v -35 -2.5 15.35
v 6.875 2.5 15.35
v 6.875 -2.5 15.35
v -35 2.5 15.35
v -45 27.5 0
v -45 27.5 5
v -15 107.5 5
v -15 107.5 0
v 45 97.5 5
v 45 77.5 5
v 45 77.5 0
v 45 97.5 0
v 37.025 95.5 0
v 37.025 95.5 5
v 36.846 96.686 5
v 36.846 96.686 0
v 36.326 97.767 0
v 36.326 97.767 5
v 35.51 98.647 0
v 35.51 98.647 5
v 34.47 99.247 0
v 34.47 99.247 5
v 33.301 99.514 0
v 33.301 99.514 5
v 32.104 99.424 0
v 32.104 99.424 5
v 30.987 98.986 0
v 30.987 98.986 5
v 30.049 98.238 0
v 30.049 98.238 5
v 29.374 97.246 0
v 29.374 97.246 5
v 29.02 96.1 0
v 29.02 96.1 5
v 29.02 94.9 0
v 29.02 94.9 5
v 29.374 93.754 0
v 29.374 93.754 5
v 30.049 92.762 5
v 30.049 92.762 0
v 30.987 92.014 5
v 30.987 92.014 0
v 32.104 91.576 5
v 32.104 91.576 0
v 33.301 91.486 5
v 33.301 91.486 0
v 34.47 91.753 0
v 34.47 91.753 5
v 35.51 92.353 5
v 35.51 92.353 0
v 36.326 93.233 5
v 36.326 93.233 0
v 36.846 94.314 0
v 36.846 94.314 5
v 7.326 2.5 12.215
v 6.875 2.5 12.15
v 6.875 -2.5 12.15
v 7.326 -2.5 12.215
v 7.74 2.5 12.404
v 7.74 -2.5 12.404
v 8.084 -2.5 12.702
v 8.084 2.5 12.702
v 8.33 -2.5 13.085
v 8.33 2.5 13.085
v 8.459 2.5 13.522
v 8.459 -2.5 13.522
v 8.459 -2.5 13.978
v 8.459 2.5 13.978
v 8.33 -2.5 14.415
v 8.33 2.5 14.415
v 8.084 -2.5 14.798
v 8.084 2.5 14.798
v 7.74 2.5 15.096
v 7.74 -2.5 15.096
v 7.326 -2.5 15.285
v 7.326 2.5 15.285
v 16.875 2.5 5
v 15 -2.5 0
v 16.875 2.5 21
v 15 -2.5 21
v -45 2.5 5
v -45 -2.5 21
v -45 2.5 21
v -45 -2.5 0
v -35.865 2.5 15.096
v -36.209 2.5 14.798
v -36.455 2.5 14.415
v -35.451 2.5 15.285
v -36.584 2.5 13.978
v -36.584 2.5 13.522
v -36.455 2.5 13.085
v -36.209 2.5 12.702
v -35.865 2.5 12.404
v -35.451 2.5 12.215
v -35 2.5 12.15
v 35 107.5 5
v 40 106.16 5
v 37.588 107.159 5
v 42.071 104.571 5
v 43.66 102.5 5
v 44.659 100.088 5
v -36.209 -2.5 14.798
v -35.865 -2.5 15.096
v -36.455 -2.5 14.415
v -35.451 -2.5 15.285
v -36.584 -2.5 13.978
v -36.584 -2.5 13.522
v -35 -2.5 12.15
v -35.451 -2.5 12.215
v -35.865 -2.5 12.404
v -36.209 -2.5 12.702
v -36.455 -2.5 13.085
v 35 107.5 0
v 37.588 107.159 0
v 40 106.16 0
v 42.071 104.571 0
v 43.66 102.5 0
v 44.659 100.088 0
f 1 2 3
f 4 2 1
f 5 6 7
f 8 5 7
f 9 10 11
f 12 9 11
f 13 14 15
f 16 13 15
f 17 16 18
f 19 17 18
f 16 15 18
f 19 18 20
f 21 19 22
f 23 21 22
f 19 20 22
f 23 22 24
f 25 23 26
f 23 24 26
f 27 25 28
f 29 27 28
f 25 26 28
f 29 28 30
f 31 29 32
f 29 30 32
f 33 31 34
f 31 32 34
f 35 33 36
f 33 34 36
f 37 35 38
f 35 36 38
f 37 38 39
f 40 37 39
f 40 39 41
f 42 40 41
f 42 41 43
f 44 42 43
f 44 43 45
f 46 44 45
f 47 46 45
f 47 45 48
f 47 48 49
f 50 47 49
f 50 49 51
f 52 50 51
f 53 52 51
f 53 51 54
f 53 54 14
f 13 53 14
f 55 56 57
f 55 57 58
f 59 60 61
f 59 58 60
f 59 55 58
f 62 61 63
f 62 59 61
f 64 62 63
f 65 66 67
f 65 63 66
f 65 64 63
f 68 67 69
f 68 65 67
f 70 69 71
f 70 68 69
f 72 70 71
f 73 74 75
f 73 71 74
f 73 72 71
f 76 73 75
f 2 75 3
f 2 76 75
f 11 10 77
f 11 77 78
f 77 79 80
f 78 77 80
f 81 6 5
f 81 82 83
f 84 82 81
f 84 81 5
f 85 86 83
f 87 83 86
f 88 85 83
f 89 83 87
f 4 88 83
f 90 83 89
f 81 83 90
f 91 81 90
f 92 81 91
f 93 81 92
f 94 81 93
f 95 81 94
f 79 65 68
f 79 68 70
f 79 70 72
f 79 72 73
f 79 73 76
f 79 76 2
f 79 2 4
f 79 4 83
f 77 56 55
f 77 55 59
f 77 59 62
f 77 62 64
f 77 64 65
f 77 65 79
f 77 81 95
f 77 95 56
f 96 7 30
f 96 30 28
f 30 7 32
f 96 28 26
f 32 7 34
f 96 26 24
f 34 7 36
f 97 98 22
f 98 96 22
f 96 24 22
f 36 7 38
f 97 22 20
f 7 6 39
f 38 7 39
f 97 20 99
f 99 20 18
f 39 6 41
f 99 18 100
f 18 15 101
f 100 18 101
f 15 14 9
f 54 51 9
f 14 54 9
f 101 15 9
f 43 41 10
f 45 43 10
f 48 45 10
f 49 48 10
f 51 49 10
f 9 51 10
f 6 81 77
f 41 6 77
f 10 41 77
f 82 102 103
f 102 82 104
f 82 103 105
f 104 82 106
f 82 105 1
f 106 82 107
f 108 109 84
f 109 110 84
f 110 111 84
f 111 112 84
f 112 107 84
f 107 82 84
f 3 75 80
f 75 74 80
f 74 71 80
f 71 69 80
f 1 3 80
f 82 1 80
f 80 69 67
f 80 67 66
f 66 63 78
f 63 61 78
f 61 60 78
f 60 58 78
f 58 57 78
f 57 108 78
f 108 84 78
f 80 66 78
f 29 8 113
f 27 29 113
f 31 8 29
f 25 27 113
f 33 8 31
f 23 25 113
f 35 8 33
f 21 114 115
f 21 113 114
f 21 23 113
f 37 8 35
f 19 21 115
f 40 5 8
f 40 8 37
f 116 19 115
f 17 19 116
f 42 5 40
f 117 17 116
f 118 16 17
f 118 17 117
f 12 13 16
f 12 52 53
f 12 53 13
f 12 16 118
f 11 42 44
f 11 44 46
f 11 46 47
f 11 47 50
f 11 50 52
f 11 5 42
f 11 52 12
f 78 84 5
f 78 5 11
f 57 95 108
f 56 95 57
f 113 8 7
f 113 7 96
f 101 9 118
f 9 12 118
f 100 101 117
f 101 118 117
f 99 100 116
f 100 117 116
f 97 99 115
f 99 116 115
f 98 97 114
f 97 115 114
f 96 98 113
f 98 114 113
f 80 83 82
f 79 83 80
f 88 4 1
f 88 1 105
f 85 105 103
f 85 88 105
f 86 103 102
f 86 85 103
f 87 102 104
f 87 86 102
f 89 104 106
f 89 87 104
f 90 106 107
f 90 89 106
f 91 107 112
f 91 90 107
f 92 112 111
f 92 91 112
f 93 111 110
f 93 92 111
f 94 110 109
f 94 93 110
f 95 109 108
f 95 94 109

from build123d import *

# Parameters (mm, degrees)
SKETCH2_W           = 90
SKETCH2_H           = 5
BOSS_EXTRUDE1_DEPTH = 21
SKETCH3_W           = 90
SKETCH3_H           = 5
BOSS_EXTRUDE2_DEPTH = 105
FILLET1_R           = 10
SKETCH4_R           = 4.025
CUT_EXTRUDE1_DEPTH  = 118.631840928
CUT_EXTRUDE2_DEPTH  = 119.415581745
CUT_EXTRUDE3_DEPTH  = 10


with BuildPart() as part:
    # Sketch2 → Boss-Extrude1 (new body)
    with BuildSketch(Plane.XY):
        Rectangle(SKETCH2_W, SKETCH2_H)
    extrude(amount=BOSS_EXTRUDE1_DEPTH)

    # Sketch3 → Boss-Extrude2 (add)
    with BuildSketch(Plane(origin=(0, 2.5, 0), x_dir=(1, 0, 0), z_dir=(0, 1, 0))):
        with Locations((0, -2.5)):
            Rectangle(SKETCH3_W, SKETCH3_H)
    extrude(amount=BOSS_EXTRUDE2_DEPTH)

    # Fillet1
    fillet1_edges = [part.edges().sort_by_distance(p)[0] for p in [
        (45, 107.5, 2.5),
    ]]
    fillet(fillet1_edges, radius=FILLET1_R)

    # Sketch4 → Cut-Extrude1 (cut, through all)
    with BuildSketch(Plane.XY.offset(5)):
        with Locations((33, 95.5)):
            Circle(SKETCH4_R)
    extrude(amount=-CUT_EXTRUDE1_DEPTH, mode=Mode.SUBTRACT)

    # Sketch6 → Cut-Extrude2 (cut, through all)
    with BuildSketch(Plane.XY.offset(21)):
        Polygon((45, 77.5), (15, -2.5), (45, -2.5), align=None)
        Polygon((-45, 27.5), (-15, 107.5), (-45, 107.5), align=None)
    extrude(amount=-CUT_EXTRUDE2_DEPTH, mode=Mode.SUBTRACT)

    # Sketch7 → Cut-Extrude3 (cut)
    with BuildSketch(Plane(origin=(0, 2.5, 0), x_dir=(1, 0, 0), z_dir=(0, 1, 0))):
        with BuildLine():
            Line((6.875, -15.35), (-35, -15.35))
            ThreePointArc((-35, -15.35), (-36.6, -13.75), (-35, -12.15))
            Line((-35, -12.15), (6.875, -12.15))
            ThreePointArc((6.875, -12.15), (8.475, -13.75), (6.875, -15.35))
        make_face()
    extrude(amount=-CUT_EXTRUDE3_DEPTH, mode=Mode.SUBTRACT)


solid = part.part
